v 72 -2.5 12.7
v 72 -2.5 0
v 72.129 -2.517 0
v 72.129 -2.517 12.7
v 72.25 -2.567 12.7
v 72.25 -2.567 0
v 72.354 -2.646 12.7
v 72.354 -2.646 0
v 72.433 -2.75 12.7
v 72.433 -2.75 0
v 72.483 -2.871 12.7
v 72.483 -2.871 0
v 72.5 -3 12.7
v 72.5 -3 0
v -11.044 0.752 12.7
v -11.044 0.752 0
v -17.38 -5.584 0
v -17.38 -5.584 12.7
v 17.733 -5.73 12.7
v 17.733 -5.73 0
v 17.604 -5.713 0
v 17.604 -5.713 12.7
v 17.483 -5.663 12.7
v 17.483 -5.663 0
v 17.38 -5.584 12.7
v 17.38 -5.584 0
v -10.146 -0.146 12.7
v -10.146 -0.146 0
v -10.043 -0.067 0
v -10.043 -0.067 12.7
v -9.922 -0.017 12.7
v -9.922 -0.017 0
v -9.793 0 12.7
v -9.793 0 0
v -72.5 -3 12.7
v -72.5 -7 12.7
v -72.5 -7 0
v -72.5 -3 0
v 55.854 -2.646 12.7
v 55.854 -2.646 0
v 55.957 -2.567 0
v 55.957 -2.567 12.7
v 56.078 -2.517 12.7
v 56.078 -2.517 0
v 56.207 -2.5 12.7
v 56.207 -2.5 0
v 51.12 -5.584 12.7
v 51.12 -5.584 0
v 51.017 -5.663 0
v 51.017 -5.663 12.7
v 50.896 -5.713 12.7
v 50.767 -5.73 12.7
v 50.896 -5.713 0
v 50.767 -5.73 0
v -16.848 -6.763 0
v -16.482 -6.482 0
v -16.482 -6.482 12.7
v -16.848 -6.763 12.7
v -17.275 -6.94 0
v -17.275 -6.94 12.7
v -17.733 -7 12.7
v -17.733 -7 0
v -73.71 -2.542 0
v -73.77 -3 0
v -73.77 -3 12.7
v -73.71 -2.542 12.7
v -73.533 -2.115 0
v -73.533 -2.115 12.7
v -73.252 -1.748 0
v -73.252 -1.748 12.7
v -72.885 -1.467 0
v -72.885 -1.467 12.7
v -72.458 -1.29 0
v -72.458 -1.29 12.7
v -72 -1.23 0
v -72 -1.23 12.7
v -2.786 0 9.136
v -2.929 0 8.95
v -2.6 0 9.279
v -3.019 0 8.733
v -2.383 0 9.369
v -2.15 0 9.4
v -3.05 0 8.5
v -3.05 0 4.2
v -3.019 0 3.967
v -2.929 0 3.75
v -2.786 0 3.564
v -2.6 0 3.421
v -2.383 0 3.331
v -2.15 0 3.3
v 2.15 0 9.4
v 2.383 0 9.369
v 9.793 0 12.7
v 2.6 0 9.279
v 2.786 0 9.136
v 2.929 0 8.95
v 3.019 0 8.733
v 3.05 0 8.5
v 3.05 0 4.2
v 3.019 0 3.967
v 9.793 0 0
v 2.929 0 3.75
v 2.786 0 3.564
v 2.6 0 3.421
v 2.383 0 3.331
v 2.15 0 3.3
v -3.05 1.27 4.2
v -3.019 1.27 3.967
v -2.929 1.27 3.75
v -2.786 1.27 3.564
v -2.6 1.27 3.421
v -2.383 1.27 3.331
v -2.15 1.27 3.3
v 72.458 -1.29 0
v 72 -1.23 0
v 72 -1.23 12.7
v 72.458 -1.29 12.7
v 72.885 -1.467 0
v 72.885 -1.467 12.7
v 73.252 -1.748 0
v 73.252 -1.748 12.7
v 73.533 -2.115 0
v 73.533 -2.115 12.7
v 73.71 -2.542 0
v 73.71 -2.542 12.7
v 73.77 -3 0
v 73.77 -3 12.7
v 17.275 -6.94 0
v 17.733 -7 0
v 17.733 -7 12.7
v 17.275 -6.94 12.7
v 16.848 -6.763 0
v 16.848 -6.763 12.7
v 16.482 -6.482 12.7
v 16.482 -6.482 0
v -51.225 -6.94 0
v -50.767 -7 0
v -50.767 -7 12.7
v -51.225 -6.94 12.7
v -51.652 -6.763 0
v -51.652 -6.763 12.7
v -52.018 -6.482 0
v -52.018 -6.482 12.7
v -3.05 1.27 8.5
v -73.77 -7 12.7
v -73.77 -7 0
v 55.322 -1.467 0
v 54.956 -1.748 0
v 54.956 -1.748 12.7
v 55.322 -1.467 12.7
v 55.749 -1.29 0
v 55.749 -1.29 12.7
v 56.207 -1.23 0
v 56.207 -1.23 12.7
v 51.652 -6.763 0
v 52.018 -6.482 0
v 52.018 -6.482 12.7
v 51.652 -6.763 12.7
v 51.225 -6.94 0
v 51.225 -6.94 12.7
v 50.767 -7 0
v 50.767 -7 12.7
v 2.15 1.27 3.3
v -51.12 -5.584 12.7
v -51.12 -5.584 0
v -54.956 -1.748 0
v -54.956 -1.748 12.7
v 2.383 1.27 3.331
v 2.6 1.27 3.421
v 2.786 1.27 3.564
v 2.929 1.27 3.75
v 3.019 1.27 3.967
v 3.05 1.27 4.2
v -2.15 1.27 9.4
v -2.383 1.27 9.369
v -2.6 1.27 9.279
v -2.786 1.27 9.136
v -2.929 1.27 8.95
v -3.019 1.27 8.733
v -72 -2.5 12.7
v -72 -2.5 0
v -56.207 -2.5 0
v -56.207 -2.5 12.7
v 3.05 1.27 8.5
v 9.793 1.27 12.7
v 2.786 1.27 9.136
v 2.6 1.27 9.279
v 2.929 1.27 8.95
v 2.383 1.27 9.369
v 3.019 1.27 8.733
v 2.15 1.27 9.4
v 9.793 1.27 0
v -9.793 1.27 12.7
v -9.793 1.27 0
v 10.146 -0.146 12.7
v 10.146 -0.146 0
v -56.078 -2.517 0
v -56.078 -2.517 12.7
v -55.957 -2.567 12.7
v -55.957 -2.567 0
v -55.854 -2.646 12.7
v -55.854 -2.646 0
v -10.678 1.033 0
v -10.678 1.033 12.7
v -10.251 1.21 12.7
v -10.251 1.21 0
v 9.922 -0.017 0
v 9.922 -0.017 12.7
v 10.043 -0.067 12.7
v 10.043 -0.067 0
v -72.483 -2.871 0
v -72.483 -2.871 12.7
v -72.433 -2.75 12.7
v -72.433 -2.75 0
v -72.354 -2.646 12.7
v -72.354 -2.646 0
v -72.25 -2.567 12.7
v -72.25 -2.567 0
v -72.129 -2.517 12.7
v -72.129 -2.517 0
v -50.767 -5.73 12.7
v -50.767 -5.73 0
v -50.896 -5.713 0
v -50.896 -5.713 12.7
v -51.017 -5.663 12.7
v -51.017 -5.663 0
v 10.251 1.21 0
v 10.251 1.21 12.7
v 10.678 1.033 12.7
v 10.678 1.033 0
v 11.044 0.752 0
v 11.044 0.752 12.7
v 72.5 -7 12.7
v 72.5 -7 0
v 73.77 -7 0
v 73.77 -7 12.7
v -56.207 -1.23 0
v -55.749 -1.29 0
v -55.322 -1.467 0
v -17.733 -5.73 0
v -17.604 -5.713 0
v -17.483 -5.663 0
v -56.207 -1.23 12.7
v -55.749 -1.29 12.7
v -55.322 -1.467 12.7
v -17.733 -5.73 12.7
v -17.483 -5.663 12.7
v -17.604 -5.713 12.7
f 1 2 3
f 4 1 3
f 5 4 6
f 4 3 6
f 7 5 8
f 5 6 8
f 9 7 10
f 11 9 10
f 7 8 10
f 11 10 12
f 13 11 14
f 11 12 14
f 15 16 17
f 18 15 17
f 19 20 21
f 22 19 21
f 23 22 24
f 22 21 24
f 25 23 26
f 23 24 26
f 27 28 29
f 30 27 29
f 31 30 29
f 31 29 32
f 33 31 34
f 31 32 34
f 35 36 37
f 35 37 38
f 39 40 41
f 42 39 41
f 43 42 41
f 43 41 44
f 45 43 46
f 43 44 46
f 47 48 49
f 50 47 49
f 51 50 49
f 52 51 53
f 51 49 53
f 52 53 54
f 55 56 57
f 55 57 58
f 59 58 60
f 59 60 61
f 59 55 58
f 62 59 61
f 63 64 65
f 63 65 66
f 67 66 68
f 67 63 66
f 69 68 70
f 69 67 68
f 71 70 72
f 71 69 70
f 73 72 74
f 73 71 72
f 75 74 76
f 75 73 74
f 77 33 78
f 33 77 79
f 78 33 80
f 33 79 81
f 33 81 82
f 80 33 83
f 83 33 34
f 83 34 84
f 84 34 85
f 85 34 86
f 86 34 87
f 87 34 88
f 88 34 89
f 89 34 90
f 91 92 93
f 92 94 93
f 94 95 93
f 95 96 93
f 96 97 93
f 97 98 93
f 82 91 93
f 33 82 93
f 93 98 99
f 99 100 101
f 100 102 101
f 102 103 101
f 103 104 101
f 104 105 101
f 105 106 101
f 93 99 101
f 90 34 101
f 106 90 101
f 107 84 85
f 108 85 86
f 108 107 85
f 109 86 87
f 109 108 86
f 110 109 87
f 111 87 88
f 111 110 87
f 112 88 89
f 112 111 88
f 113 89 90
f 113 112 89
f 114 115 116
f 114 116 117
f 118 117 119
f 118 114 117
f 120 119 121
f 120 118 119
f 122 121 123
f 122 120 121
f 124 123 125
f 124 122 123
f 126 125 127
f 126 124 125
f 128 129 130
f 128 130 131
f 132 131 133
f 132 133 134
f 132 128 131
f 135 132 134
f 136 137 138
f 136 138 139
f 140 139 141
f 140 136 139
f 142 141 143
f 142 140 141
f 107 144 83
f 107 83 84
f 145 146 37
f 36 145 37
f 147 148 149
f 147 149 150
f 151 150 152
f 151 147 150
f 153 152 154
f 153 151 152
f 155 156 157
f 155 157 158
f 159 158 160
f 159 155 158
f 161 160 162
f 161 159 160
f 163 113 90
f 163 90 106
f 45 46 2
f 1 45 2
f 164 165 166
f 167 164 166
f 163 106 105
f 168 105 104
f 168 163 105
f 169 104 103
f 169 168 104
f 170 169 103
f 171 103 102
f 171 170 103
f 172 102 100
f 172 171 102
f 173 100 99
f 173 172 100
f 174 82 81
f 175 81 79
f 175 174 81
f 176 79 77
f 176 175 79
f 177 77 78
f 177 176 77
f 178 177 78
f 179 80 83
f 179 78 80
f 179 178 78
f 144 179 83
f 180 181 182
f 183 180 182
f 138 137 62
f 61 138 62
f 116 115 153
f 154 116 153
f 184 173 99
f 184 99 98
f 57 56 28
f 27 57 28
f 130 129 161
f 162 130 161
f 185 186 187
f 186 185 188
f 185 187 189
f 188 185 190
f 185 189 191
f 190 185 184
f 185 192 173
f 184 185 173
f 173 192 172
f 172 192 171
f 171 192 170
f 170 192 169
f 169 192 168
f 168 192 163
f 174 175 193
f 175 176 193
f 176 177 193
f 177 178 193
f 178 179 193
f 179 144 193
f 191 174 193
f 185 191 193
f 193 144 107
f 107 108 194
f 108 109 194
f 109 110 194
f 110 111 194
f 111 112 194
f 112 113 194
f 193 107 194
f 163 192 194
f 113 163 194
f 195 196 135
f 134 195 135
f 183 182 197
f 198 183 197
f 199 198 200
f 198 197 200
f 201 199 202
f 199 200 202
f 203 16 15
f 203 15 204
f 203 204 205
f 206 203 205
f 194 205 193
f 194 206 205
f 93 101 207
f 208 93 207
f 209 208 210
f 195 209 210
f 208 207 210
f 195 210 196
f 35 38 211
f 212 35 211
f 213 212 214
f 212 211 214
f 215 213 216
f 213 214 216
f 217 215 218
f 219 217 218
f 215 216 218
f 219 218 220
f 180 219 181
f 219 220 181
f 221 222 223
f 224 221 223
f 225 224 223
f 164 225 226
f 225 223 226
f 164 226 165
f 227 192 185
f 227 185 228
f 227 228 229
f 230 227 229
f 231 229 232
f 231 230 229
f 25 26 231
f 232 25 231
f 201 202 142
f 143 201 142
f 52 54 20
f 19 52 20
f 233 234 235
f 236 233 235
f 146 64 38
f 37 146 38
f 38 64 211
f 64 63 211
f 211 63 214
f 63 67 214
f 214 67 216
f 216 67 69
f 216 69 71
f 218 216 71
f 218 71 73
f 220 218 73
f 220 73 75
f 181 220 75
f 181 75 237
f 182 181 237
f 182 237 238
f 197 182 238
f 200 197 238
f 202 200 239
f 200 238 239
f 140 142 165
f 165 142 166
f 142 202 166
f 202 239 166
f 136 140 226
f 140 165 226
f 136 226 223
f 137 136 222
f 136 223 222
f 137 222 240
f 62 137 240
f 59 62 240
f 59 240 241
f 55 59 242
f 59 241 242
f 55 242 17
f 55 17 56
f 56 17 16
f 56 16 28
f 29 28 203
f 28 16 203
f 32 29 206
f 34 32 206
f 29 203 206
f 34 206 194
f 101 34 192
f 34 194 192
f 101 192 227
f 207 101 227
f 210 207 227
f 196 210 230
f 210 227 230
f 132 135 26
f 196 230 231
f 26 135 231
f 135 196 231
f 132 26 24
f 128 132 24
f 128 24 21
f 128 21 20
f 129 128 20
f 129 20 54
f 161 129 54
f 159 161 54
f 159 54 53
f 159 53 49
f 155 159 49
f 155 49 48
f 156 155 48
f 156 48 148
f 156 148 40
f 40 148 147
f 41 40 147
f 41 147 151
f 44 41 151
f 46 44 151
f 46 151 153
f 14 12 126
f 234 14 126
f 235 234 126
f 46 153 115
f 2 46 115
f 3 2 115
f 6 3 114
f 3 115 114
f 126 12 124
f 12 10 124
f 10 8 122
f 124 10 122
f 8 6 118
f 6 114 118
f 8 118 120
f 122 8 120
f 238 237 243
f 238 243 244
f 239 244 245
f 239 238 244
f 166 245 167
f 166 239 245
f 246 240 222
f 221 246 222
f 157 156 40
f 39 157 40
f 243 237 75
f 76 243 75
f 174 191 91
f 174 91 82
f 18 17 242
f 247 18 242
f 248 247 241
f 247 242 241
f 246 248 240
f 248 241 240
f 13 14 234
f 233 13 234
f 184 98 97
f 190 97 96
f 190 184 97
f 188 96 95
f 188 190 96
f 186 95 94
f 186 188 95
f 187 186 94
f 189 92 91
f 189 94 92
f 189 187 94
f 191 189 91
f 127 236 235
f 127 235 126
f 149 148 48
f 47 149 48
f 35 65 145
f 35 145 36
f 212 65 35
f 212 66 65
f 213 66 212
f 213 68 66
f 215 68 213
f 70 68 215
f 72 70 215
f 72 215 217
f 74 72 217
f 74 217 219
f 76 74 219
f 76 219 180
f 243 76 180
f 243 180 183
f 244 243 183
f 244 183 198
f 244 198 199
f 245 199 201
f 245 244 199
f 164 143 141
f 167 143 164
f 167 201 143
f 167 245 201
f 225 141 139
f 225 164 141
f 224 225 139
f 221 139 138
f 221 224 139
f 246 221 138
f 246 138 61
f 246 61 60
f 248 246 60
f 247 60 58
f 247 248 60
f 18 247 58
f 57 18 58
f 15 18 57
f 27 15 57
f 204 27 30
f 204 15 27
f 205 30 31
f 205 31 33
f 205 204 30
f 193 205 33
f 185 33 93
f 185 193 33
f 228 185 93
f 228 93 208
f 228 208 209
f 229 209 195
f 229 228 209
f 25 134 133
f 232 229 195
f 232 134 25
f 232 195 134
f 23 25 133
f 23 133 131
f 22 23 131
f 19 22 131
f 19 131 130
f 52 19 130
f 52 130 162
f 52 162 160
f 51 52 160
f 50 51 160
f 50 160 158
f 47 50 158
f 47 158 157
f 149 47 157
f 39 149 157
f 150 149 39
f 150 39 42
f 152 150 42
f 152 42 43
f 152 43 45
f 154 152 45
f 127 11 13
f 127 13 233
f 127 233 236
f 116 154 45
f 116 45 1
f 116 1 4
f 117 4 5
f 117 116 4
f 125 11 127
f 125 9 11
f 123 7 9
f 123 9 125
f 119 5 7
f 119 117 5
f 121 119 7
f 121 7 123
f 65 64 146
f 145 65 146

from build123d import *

# Parameters (mm, degrees)
BOSS_EXTRUDE1_DEPTH    = 12.7
CUT_EXTRUDE1_DEPTH     = 12.7
CONVERT_SOLID1_DEPTH   = 12.7
CONVERT_SOLID1_2_DEPTH = 12.7


# Read off the part's stored shape, not the designer's step: Convert-Solid1
with BuildPart() as part:
    # Sketch1 → Boss-Extrude1 (new body)
    with BuildSketch(Plane.XY):
        Polygon((0, 0), (10, 0), (17, -7), (51.5, -7), (56, -2.5), (72.5, -2.5), (72.5, -7), (73.77, -7), (73.77, -1.23), (55.473948776, -1.23), (50.973948776, -5.73), (17.526051224, -5.73), (10.526051224, 1.27), (0, 1.27), (-10.526051224, 1.27), (-17.526051224, -5.73), (-50.973948776, -5.73), (-55.473948776, -1.23), (-73.77, -1.23), (-73.77, -7), (-72.5, -7), (-72.5, -2.5), (-56, -2.5), (-51.5, -7), (-17, -7), (-10, 0), align=None)
    extrude(amount=BOSS_EXTRUDE1_DEPTH)

    # Sketch2 → Cut-Extrude1 (cut)
    with BuildSketch(Plane(origin=(0, 1.27, 0), x_dir=(1, 0, 0), z_dir=(0, 1, 0))):
        with BuildLine():
            Line((-2.15, -3.3), (2.15, -3.3))
            ThreePointArc((2.15, -3.3), (2.786396103, -3.563603897), (3.05, -4.2))
            Line((3.05, -4.2), (3.05, -8.5))
            ThreePointArc((3.05, -8.5), (2.786396103, -9.136396103), (2.15, -9.4))
            Line((2.15, -9.4), (-2.15, -9.4))
            ThreePointArc((-2.15, -9.4), (-2.786396103, -9.136396103), (-3.05, -8.5))
            Line((-3.05, -8.5), (-3.05, -4.2))
            ThreePointArc((-3.05, -4.2), (-2.786396103, -3.563603897), (-2.15, -3.3))
        make_face()
    extrude(amount=-CUT_EXTRUDE1_DEPTH, mode=Mode.SUBTRACT)

    # Convert-Solid1 outline → Convert-Solid1 (cut)
    with BuildSketch(Plane.XY):
        with BuildLine():
            Line((73.77, -1.23), (72, -1.23))
            ThreePointArc((72, -1.23), (73.251579003, -1.748420997), (73.77, -3))
            Line((73.77, -3), (73.77, -1.23))
        make_face()
        with BuildLine():
            ThreePointArc((54.955527778, -1.748420997), (55.529757106, -1.364733227), (56.207106781, -1.23))
            Line((56.207106781, -1.23), (55.473948776, -1.23))
            Line((55.473948776, -1.23), (54.955527778, -1.748420997))
        make_face()
        with BuildLine():
            ThreePointArc((9.792893219, 1.27), (10.470242894, 1.135266773), (11.044472222, 0.751579003))
            Line((11.044472222, 0.751579003), (10.526051224, 1.27))
            Line((10.526051224, 1.27), (9.792893219, 1.27))
        make_face()
        with BuildLine():
            Line((51.5, -7), (52.018420997, -6.481579003))
            ThreePointArc((52.018420997, -6.481579003), (51.44419167, -6.865266773), (50.766841995, -7))
            Line((50.766841995, -7), (51.5, -7))
        make_face()
        with BuildLine():
            ThreePointArc((-11.044472222, 0.751579003), (-10.470242894, 1.135266773), (-9.792893219, 1.27))
            Line((-9.792893219, 1.27), (-10.526051224, 1.27))
            Line((-10.526051224, 1.27), (-11.044472222, 0.751579003))
        make_face()
        with BuildLine():
            Line((17, -7), (17.733158005, -7))
            ThreePointArc((17.733158005, -7), (17.05580833, -6.865266773), (16.481579003, -6.481579003))
            Line((16.481579003, -6.481579003), (17, -7))
        make_face()
        with BuildLine():
            ThreePointArc((-56.207106781, -1.23), (-55.529757106, -1.364733227), (-54.955527778, -1.748420997))
            Line((-54.955527778, -1.748420997), (-55.473948776, -1.23))
            Line((-55.473948776, -1.23), (-56.207106781, -1.23))
        make_face()
        with BuildLine():
            Line((-17, -7), (-16.481579003, -6.481579003))
            ThreePointArc((-16.481579003, -6.481579003), (-17.05580833, -6.865266773), (-17.733158005, -7))
            Line((-17.733158005, -7), (-17, -7))
        make_face()
        with BuildLine():
            ThreePointArc((-73.77, -3), (-73.251579003, -1.748420997), (-72, -1.23))
            Line((-72, -1.23), (-73.77, -1.23))
            Line((-73.77, -1.23), (-73.77, -3))
        make_face()
        with BuildLine():
            Line((-51.5, -7), (-50.766841995, -7))
            ThreePointArc((-50.766841995, -7), (-51.44419167, -6.865266773), (-52.018420997, -6.481579003))
            Line((-52.018420997, -6.481579003), (-51.5, -7))
        make_face()
    extrude(amount=CONVERT_SOLID1_DEPTH, mode=Mode.SUBTRACT)

    # Convert-Solid1 2 outline → Convert-Solid1 2 (add)
    with BuildSketch(Plane.XY):
        with BuildLine():
            Line((50.973948776, -5.73), (51.120395385, -5.583553391))
            ThreePointArc((51.120395385, -5.583553391), (50.958183711, -5.691939766), (50.766841995, -5.73))
            Line((50.766841995, -5.73), (50.973948776, -5.73))
        make_face()
        with BuildLine():
            ThreePointArc((72, -2.5), (72.353553391, -2.646446609), (72.5, -3))
            Line((72.5, -3), (72.5, -2.5))
            Line((72.5, -2.5), (72, -2.5))
        make_face()
        with BuildLine():
            Line((17.526051224, -5.73), (17.733158005, -5.73))
            ThreePointArc((17.733158005, -5.73), (17.541816289, -5.691939766), (17.379604615, -5.583553391))
            Line((17.379604615, -5.583553391), (17.526051224, -5.73))
        make_face()
        with BuildLine():
            ThreePointArc((55.853553391, -2.646446609), (56.015765065, -2.538060234), (56.207106781, -2.5))
            Line((56.207106781, -2.5), (56, -2.5))
            Line((56, -2.5), (55.853553391, -2.646446609))
        make_face()
        with BuildLine():
            Line((-17.526051224, -5.73), (-17.379604615, -5.583553391))
            ThreePointArc((-17.379604615, -5.583553391), (-17.541816289, -5.691939766), (-17.733158005, -5.73))
            Line((-17.733158005, -5.73), (-17.526051224, -5.73))
        make_face()
        with BuildLine():
            ThreePointArc((9.792893219, 0), (9.984234935, -0.038060234), (10.146446609, -0.146446609))
            Line((10.146446609, -0.146446609), (10, 0))
            Line((10, 0), (9.792893219, 0))
        make_face()
        with BuildLine():
            Line((-50.973948776, -5.73), (-50.766841995, -5.73))
            ThreePointArc((-50.766841995, -5.73), (-50.958183711, -5.691939766), (-51.120395385, -5.583553391))
            Line((-51.120395385, -5.583553391), (-50.973948776, -5.73))
        make_face()
        with BuildLine():
            ThreePointArc((-10.146446609, -0.146446609), (-9.984234935, -0.038060234), (-9.792893219, 0))
            Line((-9.792893219, 0), (-10, 0))
            Line((-10, 0), (-10.146446609, -0.146446609))
        make_face()
        with BuildLine():
            ThreePointArc((-56.207106781, -2.5), (-56.015765065, -2.538060234), (-55.853553391, -2.646446609))
            Line((-55.853553391, -2.646446609), (-56, -2.5))
            Line((-56, -2.5), (-56.207106781, -2.5))
        make_face()
        with BuildLine():
            Line((-72.5, -2.5), (-72.5, -3))
            ThreePointArc((-72.5, -3), (-72.353553391, -2.646446609), (-72, -2.5))
            Line((-72, -2.5), (-72.5, -2.5))
        make_face()
    extrude(amount=CONVERT_SOLID1_2_DEPTH)


solid = part.part
